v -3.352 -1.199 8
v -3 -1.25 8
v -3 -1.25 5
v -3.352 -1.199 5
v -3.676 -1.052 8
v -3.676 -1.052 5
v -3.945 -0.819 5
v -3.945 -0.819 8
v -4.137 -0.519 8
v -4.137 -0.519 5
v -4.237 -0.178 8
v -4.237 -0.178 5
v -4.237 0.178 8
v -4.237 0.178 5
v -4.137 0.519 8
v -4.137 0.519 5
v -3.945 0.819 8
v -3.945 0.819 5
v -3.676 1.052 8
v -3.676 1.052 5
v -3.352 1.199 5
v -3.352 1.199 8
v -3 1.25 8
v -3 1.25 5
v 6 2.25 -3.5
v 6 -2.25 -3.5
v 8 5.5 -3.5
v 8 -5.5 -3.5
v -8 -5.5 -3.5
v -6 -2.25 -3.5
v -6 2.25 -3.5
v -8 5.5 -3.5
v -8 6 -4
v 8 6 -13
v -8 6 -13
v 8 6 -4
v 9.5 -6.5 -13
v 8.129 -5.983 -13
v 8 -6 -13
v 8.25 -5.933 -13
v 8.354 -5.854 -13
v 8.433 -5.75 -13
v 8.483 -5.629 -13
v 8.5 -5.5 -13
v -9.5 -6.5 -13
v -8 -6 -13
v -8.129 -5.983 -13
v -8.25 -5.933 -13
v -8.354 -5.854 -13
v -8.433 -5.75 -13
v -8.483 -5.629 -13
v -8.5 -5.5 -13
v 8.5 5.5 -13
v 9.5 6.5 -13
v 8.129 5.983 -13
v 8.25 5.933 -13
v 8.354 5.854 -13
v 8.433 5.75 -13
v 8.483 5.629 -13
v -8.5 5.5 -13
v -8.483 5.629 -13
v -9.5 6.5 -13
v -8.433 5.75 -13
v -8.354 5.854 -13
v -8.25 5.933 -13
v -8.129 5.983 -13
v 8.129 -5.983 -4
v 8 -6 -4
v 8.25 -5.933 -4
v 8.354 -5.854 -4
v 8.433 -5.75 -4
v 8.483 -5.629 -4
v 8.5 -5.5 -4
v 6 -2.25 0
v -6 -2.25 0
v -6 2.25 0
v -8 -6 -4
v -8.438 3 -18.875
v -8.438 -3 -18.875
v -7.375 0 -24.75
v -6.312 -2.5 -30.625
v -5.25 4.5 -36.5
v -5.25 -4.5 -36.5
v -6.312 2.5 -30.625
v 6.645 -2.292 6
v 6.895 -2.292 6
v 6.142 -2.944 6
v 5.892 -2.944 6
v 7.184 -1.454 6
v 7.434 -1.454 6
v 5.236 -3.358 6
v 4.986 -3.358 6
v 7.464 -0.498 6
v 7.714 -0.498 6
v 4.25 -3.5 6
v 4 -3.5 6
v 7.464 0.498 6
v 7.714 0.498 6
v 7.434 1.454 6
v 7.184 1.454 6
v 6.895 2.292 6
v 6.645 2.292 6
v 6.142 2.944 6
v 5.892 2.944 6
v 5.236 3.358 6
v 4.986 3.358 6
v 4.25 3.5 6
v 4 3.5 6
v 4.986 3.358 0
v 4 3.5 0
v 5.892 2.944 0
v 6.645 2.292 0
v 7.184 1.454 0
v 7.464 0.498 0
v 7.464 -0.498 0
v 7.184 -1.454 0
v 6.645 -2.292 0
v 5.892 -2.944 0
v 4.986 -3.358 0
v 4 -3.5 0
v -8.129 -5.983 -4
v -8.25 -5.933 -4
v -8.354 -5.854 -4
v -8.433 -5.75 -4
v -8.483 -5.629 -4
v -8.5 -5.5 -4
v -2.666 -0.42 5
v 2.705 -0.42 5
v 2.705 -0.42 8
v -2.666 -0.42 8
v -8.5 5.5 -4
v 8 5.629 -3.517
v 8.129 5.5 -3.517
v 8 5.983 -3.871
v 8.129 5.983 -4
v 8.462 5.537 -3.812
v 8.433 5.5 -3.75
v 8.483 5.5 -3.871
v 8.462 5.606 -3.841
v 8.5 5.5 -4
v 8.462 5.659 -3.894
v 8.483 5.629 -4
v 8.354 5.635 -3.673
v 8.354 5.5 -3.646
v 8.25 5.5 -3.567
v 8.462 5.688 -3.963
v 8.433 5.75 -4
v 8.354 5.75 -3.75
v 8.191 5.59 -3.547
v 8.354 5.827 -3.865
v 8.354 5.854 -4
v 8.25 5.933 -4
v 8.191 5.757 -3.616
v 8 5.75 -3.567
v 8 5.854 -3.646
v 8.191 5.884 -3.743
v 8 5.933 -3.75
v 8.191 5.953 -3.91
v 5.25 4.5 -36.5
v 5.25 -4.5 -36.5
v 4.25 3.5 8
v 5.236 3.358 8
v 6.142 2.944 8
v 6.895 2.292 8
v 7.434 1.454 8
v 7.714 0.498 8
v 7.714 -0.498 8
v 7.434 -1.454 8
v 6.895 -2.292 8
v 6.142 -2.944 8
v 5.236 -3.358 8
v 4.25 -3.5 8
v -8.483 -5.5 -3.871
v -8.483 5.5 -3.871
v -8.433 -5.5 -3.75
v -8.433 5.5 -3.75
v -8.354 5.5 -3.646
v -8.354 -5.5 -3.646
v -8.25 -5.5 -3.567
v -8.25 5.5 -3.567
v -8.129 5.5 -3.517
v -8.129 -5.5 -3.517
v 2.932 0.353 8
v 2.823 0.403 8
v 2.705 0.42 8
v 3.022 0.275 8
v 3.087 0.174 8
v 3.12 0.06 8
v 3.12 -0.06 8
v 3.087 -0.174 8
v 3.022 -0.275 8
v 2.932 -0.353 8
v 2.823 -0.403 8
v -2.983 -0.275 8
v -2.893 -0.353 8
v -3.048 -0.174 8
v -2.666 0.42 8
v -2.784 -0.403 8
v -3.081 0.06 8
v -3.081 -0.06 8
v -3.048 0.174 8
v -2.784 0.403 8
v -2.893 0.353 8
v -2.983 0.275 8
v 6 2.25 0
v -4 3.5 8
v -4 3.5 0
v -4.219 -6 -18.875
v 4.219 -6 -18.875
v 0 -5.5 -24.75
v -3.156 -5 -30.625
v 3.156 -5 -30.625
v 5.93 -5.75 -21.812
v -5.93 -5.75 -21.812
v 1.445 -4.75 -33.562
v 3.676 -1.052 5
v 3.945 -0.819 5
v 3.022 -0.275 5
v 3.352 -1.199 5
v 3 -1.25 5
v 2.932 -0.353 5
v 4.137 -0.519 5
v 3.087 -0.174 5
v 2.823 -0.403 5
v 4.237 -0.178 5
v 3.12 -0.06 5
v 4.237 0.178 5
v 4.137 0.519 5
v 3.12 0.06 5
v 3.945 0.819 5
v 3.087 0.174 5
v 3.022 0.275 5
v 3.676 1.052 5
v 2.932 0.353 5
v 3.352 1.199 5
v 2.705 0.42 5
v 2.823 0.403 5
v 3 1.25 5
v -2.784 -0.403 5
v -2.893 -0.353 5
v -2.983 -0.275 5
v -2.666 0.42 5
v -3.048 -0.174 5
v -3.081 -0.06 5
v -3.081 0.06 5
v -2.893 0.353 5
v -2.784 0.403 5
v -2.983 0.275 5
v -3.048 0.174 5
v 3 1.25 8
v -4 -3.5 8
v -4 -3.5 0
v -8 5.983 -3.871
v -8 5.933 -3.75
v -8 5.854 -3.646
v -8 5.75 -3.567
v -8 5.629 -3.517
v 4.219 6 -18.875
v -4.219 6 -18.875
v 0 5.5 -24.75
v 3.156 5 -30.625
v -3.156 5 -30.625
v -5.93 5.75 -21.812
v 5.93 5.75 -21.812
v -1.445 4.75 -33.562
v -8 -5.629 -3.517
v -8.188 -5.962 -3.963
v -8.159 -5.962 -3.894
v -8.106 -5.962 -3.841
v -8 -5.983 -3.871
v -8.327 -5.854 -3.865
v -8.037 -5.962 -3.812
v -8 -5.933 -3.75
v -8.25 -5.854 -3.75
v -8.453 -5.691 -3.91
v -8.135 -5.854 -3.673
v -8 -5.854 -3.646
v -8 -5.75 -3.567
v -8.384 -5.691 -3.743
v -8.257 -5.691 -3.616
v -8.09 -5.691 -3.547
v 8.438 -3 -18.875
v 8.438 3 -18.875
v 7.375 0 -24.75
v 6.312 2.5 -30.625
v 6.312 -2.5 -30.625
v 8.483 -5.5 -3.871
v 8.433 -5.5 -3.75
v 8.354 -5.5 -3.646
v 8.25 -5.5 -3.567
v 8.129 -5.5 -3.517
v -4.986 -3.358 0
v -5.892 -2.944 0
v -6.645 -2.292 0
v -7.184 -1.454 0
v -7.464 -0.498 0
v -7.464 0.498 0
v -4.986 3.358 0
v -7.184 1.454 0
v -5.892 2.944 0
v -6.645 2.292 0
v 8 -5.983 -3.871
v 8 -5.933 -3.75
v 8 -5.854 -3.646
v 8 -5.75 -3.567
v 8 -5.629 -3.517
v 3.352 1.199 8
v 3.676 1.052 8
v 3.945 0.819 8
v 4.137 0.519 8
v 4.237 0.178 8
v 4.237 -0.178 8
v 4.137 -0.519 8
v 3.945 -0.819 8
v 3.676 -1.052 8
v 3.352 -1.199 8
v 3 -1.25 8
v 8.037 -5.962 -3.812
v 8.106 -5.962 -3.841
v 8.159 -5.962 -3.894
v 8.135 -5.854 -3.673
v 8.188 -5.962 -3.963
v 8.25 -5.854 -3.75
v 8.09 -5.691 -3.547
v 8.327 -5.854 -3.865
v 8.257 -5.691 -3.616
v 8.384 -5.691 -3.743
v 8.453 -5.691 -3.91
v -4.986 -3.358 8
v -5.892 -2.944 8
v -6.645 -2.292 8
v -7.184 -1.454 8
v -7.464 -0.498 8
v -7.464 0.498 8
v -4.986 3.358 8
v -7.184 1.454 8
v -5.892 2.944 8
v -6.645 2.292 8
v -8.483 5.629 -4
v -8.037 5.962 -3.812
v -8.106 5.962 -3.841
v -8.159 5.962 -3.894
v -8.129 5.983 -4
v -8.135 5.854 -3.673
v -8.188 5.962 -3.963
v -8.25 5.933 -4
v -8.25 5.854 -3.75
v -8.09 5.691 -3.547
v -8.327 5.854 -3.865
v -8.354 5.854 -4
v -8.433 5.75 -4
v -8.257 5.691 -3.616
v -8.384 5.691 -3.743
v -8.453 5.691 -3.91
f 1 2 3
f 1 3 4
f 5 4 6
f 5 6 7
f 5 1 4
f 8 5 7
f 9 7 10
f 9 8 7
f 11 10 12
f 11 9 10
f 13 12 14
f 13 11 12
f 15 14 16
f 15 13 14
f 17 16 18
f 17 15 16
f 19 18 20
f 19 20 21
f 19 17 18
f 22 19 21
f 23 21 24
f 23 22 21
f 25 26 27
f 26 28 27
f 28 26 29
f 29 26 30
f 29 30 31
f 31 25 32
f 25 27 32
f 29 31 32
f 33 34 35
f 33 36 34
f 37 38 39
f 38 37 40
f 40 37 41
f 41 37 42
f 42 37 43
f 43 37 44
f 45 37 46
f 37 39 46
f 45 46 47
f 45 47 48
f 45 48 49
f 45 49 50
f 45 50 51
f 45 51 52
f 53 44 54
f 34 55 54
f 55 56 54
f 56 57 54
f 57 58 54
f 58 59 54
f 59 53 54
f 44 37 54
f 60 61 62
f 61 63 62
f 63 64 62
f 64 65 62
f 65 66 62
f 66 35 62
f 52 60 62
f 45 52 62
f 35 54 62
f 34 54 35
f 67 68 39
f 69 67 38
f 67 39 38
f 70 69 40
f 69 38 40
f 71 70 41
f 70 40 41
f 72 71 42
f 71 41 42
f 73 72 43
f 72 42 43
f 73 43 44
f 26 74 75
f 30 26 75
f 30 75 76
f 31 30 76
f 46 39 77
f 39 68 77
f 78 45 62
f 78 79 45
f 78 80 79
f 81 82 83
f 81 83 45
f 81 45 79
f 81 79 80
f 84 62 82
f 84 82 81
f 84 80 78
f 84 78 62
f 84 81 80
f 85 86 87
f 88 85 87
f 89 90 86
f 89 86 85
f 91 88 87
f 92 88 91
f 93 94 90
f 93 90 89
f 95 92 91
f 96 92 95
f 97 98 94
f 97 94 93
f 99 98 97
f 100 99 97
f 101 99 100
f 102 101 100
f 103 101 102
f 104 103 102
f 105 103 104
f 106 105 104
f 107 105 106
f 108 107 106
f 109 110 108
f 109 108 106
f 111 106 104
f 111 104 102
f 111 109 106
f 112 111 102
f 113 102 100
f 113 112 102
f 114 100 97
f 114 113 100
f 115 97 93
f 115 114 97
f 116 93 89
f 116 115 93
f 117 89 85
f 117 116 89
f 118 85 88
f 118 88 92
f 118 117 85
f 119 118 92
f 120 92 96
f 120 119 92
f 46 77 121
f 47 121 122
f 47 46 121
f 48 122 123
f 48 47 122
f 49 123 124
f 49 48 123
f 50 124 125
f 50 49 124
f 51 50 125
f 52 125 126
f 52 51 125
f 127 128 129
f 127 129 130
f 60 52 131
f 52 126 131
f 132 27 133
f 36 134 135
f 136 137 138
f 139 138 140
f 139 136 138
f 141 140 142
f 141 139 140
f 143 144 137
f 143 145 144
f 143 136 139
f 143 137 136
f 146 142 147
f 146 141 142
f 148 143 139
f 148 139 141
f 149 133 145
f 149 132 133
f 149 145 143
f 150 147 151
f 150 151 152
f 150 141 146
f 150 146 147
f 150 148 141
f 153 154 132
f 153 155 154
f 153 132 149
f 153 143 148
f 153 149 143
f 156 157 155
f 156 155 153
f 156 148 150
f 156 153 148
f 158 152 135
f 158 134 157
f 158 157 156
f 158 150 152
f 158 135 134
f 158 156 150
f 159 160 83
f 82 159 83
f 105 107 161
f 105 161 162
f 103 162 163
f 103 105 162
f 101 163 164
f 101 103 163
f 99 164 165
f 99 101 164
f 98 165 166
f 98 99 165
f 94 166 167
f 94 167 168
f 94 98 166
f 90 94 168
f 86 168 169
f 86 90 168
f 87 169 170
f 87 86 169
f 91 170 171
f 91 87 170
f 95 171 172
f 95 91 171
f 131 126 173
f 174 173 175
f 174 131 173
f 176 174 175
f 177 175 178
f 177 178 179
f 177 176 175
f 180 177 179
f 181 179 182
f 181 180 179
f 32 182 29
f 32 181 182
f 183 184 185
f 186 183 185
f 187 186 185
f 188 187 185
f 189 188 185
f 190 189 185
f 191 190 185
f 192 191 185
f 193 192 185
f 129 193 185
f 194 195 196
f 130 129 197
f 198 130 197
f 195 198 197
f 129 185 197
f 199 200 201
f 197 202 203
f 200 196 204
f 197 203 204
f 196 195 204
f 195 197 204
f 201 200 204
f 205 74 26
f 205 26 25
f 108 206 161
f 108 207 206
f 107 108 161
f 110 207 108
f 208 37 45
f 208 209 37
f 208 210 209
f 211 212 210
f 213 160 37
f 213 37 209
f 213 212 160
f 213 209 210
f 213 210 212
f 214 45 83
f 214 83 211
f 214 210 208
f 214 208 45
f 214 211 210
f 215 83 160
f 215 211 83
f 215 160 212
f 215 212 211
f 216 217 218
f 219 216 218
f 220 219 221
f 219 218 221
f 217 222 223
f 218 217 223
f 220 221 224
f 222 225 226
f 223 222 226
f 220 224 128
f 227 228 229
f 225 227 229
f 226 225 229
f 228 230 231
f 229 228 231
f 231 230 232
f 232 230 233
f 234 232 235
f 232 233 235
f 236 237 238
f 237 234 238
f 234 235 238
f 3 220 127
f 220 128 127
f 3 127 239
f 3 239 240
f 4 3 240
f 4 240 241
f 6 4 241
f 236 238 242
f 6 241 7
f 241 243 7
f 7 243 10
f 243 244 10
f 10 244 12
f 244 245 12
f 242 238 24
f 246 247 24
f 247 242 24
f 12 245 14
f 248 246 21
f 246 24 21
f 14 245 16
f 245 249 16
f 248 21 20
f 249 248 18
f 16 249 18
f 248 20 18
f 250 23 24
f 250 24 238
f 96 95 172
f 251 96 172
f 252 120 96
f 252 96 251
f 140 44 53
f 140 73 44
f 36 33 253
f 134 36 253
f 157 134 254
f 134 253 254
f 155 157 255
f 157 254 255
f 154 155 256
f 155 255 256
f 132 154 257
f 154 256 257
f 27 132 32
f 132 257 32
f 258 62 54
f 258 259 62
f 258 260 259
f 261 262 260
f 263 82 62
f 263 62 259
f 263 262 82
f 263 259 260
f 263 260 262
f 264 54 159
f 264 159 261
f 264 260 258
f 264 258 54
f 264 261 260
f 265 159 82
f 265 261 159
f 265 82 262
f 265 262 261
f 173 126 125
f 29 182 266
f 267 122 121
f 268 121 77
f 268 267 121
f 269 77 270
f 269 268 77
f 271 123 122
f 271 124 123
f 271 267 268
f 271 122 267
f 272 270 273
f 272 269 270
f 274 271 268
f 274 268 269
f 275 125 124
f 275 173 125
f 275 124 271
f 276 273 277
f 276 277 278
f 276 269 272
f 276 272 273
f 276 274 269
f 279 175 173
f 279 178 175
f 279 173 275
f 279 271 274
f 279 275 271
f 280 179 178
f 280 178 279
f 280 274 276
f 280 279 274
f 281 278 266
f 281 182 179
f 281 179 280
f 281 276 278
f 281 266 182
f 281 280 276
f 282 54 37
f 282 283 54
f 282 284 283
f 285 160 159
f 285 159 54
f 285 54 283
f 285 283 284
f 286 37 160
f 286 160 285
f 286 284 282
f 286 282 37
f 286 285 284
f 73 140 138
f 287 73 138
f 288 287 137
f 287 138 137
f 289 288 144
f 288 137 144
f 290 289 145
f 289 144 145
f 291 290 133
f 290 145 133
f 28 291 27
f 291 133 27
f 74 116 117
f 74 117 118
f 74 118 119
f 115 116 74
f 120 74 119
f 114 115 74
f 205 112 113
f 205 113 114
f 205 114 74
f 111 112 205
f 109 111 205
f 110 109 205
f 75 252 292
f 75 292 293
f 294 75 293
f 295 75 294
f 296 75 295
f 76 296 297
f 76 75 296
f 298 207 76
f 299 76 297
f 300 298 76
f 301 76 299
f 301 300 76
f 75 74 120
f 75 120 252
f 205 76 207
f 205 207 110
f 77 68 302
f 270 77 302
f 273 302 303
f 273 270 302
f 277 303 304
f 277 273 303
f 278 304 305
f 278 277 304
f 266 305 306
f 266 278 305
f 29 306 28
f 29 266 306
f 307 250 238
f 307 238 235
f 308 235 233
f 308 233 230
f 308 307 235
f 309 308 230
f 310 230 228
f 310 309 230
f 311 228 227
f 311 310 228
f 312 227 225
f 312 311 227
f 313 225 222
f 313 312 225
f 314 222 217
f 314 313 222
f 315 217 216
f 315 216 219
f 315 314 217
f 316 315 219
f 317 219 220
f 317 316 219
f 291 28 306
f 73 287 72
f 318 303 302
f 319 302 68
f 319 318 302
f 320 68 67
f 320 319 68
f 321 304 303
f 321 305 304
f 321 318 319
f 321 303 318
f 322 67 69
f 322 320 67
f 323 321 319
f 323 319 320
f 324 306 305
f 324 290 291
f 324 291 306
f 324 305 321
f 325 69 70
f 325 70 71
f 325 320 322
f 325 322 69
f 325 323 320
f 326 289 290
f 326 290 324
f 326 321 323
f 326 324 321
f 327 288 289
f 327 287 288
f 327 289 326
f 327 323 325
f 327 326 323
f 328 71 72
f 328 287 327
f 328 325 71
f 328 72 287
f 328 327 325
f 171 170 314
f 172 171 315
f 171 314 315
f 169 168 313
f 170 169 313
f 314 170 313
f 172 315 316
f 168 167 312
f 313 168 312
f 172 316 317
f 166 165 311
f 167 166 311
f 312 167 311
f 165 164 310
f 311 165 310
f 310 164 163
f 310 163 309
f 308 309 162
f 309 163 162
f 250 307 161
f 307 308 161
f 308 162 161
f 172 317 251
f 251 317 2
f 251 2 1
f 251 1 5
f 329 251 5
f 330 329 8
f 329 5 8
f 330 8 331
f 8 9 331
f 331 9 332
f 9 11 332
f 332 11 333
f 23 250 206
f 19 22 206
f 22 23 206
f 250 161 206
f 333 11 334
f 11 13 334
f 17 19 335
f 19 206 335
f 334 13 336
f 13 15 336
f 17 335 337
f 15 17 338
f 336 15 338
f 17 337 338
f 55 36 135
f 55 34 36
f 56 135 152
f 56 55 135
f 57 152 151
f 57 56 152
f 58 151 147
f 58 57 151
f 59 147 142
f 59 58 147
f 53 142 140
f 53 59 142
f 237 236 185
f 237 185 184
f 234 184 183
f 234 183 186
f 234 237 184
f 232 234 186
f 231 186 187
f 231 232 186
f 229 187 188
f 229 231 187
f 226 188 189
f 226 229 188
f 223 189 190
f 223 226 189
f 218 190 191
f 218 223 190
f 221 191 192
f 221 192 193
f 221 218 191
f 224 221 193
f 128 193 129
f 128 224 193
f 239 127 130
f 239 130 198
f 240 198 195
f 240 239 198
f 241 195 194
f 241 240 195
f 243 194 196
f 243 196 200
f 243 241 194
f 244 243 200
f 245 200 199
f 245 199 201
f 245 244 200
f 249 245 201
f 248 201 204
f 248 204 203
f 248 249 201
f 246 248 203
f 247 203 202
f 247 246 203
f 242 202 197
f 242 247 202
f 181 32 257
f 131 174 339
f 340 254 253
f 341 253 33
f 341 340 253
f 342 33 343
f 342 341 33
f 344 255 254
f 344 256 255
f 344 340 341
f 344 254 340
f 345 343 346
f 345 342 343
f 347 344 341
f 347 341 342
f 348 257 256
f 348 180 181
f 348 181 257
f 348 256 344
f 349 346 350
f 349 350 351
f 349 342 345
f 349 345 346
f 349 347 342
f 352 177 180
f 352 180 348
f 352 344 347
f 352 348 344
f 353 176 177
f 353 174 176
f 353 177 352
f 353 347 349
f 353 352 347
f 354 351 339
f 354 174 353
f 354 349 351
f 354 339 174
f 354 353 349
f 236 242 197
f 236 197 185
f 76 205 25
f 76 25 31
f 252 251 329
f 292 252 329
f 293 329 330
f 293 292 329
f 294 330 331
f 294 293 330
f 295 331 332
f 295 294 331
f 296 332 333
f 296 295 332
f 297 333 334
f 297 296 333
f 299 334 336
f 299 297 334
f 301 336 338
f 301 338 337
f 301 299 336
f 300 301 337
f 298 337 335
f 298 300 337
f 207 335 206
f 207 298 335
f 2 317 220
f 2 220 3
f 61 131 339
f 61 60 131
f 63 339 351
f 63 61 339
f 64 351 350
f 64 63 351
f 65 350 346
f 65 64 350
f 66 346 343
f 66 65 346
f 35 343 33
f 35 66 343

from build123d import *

# Parameters (mm, degrees)
SALIENTE_EXTRUIR1_DEPTH = 6
SALIENTE_EXTRUIR2_DEPTH = 2
CROQUIS3_W              = 12
CROQUIS3_H              = 4.5
SALIENTE_EXTRUIR3_DEPTH = 3.5
CROQUIS4_W              = 17
CROQUIS4_H              = 12
SALIENTE_EXTRUIR4_DEPTH = 9.5
CROQUIS5_W              = 19
CROQUIS5_H              = 13
CROQUIS6_W              = 10.5
CROQUIS6_H              = 9
REDONDEO1_R             = 0.5
CORTAR_EXTRUIR1_DEPTH   = 3
SALIENTE_EXTRUIR5_DEPTH = 3


with BuildPart() as part:
    # Croquis1 → Saliente-Extruir1 (new body)
    with BuildSketch(Plane.XY):
        with BuildLine():
            Line((-4, 3.5), (4, 3.5))
            ThreePointArc((4, 3.5), (7.5, 0), (4, -3.5))
            Line((4, -3.5), (-4, -3.5))
            ThreePointArc((-4, -3.5), (-7.5, 0), (-4, 3.5))
        make_face()
    extrude(amount=SALIENTE_EXTRUIR1_DEPTH)

    # Croquis2 → Saliente-Extruir2 (add)
    with BuildSketch(Plane.XY.offset(6)):
        with BuildLine():
            Line((-4, 3.5), (4.25, 3.5))
            ThreePointArc((4.25, 3.5), (7.75, 0), (4.25, -3.5))
            Line((4.25, -3.5), (-4, -3.5))
            ThreePointArc((-4, -3.5), (-7.5, 0), (-4, 3.5))
        make_face()
    extrude(amount=SALIENTE_EXTRUIR2_DEPTH)

    # Croquis3 → Saliente-Extruir3 (add)
    with BuildSketch(Plane(origin=(0, 0, 0), x_dir=(-1, 0, 0), z_dir=(0, 0, -1))):
        Rectangle(CROQUIS3_W, CROQUIS3_H)
    extrude(amount=SALIENTE_EXTRUIR3_DEPTH)

    # Croquis4 → Saliente-Extruir4 (add)
    with BuildSketch(Plane(origin=(0, 0, -3.5), x_dir=(-1, 0, 0), z_dir=(0, 0, -1))):
        Rectangle(CROQUIS4_W, CROQUIS4_H)
    extrude(amount=SALIENTE_EXTRUIR4_DEPTH)

    # Croquis5 → Recubrir1 section 0
    with BuildSketch(Plane(origin=(0, 0, -13), x_dir=(-1, 0, 0), z_dir=(0, 0, -1))):
        Rectangle(CROQUIS5_W, CROQUIS5_H)
    # Croquis6 → Recubrir1 section 1
    with BuildSketch(Plane(origin=(0, 0, -36.5), x_dir=(-1, 0, 0), z_dir=(0, 0, -1))):
        Rectangle(CROQUIS6_W, CROQUIS6_H)
    loft()

    # Redondeo1
    redondeo1_edges = [part.edges().sort_by_distance(p)[0] for p in [
        (-8.5, 0, -3.5),
        (-8.5, -6, -8.25),
        (0, 6, -3.5),
        (-8.5, 6, -8.25),
        (8.5, 0, -3.5),
        (8.5, 6, -8.25),
        (0, -6, -3.5),
        (8.5, -6, -8.25),
    ]]
    fillet(redondeo1_edges, radius=REDONDEO1_R)

    # Croquis7 → Cortar-Extruir1 (cut)
    with BuildSketch(Plane.XY.offset(8)):
        with BuildLine():
            Line((-3, 1.25), (3, 1.25))
            ThreePointArc((3, 1.25), (4.25, 0), (3, -1.25))
            Line((3, -1.25), (-3, -1.25))
            ThreePointArc((-3, -1.25), (-4.25, 0), (-3, 1.25))
        make_face()
    extrude(amount=-CORTAR_EXTRUIR1_DEPTH, mode=Mode.SUBTRACT)

    # Croquis8 → Saliente-Extruir5 (add)
    with BuildSketch(Plane.XY.offset(5)):
        with BuildLine():
            Line((-2.665643122, 0.419863202), (2.704700164, 0.419863202))
            ThreePointArc((2.704700164, 0.419863202), (3.124563366, 0), (2.704700164, -0.419863202))
            Line((2.704700164, -0.419863202), (-2.665643122, -0.419863202))
            ThreePointArc((-2.665643122, -0.419863202), (-3.085506324, 0), (-2.665643122, 0.419863202))
        make_face()
    extrude(amount=SALIENTE_EXTRUIR5_DEPTH)


solid = part.part
